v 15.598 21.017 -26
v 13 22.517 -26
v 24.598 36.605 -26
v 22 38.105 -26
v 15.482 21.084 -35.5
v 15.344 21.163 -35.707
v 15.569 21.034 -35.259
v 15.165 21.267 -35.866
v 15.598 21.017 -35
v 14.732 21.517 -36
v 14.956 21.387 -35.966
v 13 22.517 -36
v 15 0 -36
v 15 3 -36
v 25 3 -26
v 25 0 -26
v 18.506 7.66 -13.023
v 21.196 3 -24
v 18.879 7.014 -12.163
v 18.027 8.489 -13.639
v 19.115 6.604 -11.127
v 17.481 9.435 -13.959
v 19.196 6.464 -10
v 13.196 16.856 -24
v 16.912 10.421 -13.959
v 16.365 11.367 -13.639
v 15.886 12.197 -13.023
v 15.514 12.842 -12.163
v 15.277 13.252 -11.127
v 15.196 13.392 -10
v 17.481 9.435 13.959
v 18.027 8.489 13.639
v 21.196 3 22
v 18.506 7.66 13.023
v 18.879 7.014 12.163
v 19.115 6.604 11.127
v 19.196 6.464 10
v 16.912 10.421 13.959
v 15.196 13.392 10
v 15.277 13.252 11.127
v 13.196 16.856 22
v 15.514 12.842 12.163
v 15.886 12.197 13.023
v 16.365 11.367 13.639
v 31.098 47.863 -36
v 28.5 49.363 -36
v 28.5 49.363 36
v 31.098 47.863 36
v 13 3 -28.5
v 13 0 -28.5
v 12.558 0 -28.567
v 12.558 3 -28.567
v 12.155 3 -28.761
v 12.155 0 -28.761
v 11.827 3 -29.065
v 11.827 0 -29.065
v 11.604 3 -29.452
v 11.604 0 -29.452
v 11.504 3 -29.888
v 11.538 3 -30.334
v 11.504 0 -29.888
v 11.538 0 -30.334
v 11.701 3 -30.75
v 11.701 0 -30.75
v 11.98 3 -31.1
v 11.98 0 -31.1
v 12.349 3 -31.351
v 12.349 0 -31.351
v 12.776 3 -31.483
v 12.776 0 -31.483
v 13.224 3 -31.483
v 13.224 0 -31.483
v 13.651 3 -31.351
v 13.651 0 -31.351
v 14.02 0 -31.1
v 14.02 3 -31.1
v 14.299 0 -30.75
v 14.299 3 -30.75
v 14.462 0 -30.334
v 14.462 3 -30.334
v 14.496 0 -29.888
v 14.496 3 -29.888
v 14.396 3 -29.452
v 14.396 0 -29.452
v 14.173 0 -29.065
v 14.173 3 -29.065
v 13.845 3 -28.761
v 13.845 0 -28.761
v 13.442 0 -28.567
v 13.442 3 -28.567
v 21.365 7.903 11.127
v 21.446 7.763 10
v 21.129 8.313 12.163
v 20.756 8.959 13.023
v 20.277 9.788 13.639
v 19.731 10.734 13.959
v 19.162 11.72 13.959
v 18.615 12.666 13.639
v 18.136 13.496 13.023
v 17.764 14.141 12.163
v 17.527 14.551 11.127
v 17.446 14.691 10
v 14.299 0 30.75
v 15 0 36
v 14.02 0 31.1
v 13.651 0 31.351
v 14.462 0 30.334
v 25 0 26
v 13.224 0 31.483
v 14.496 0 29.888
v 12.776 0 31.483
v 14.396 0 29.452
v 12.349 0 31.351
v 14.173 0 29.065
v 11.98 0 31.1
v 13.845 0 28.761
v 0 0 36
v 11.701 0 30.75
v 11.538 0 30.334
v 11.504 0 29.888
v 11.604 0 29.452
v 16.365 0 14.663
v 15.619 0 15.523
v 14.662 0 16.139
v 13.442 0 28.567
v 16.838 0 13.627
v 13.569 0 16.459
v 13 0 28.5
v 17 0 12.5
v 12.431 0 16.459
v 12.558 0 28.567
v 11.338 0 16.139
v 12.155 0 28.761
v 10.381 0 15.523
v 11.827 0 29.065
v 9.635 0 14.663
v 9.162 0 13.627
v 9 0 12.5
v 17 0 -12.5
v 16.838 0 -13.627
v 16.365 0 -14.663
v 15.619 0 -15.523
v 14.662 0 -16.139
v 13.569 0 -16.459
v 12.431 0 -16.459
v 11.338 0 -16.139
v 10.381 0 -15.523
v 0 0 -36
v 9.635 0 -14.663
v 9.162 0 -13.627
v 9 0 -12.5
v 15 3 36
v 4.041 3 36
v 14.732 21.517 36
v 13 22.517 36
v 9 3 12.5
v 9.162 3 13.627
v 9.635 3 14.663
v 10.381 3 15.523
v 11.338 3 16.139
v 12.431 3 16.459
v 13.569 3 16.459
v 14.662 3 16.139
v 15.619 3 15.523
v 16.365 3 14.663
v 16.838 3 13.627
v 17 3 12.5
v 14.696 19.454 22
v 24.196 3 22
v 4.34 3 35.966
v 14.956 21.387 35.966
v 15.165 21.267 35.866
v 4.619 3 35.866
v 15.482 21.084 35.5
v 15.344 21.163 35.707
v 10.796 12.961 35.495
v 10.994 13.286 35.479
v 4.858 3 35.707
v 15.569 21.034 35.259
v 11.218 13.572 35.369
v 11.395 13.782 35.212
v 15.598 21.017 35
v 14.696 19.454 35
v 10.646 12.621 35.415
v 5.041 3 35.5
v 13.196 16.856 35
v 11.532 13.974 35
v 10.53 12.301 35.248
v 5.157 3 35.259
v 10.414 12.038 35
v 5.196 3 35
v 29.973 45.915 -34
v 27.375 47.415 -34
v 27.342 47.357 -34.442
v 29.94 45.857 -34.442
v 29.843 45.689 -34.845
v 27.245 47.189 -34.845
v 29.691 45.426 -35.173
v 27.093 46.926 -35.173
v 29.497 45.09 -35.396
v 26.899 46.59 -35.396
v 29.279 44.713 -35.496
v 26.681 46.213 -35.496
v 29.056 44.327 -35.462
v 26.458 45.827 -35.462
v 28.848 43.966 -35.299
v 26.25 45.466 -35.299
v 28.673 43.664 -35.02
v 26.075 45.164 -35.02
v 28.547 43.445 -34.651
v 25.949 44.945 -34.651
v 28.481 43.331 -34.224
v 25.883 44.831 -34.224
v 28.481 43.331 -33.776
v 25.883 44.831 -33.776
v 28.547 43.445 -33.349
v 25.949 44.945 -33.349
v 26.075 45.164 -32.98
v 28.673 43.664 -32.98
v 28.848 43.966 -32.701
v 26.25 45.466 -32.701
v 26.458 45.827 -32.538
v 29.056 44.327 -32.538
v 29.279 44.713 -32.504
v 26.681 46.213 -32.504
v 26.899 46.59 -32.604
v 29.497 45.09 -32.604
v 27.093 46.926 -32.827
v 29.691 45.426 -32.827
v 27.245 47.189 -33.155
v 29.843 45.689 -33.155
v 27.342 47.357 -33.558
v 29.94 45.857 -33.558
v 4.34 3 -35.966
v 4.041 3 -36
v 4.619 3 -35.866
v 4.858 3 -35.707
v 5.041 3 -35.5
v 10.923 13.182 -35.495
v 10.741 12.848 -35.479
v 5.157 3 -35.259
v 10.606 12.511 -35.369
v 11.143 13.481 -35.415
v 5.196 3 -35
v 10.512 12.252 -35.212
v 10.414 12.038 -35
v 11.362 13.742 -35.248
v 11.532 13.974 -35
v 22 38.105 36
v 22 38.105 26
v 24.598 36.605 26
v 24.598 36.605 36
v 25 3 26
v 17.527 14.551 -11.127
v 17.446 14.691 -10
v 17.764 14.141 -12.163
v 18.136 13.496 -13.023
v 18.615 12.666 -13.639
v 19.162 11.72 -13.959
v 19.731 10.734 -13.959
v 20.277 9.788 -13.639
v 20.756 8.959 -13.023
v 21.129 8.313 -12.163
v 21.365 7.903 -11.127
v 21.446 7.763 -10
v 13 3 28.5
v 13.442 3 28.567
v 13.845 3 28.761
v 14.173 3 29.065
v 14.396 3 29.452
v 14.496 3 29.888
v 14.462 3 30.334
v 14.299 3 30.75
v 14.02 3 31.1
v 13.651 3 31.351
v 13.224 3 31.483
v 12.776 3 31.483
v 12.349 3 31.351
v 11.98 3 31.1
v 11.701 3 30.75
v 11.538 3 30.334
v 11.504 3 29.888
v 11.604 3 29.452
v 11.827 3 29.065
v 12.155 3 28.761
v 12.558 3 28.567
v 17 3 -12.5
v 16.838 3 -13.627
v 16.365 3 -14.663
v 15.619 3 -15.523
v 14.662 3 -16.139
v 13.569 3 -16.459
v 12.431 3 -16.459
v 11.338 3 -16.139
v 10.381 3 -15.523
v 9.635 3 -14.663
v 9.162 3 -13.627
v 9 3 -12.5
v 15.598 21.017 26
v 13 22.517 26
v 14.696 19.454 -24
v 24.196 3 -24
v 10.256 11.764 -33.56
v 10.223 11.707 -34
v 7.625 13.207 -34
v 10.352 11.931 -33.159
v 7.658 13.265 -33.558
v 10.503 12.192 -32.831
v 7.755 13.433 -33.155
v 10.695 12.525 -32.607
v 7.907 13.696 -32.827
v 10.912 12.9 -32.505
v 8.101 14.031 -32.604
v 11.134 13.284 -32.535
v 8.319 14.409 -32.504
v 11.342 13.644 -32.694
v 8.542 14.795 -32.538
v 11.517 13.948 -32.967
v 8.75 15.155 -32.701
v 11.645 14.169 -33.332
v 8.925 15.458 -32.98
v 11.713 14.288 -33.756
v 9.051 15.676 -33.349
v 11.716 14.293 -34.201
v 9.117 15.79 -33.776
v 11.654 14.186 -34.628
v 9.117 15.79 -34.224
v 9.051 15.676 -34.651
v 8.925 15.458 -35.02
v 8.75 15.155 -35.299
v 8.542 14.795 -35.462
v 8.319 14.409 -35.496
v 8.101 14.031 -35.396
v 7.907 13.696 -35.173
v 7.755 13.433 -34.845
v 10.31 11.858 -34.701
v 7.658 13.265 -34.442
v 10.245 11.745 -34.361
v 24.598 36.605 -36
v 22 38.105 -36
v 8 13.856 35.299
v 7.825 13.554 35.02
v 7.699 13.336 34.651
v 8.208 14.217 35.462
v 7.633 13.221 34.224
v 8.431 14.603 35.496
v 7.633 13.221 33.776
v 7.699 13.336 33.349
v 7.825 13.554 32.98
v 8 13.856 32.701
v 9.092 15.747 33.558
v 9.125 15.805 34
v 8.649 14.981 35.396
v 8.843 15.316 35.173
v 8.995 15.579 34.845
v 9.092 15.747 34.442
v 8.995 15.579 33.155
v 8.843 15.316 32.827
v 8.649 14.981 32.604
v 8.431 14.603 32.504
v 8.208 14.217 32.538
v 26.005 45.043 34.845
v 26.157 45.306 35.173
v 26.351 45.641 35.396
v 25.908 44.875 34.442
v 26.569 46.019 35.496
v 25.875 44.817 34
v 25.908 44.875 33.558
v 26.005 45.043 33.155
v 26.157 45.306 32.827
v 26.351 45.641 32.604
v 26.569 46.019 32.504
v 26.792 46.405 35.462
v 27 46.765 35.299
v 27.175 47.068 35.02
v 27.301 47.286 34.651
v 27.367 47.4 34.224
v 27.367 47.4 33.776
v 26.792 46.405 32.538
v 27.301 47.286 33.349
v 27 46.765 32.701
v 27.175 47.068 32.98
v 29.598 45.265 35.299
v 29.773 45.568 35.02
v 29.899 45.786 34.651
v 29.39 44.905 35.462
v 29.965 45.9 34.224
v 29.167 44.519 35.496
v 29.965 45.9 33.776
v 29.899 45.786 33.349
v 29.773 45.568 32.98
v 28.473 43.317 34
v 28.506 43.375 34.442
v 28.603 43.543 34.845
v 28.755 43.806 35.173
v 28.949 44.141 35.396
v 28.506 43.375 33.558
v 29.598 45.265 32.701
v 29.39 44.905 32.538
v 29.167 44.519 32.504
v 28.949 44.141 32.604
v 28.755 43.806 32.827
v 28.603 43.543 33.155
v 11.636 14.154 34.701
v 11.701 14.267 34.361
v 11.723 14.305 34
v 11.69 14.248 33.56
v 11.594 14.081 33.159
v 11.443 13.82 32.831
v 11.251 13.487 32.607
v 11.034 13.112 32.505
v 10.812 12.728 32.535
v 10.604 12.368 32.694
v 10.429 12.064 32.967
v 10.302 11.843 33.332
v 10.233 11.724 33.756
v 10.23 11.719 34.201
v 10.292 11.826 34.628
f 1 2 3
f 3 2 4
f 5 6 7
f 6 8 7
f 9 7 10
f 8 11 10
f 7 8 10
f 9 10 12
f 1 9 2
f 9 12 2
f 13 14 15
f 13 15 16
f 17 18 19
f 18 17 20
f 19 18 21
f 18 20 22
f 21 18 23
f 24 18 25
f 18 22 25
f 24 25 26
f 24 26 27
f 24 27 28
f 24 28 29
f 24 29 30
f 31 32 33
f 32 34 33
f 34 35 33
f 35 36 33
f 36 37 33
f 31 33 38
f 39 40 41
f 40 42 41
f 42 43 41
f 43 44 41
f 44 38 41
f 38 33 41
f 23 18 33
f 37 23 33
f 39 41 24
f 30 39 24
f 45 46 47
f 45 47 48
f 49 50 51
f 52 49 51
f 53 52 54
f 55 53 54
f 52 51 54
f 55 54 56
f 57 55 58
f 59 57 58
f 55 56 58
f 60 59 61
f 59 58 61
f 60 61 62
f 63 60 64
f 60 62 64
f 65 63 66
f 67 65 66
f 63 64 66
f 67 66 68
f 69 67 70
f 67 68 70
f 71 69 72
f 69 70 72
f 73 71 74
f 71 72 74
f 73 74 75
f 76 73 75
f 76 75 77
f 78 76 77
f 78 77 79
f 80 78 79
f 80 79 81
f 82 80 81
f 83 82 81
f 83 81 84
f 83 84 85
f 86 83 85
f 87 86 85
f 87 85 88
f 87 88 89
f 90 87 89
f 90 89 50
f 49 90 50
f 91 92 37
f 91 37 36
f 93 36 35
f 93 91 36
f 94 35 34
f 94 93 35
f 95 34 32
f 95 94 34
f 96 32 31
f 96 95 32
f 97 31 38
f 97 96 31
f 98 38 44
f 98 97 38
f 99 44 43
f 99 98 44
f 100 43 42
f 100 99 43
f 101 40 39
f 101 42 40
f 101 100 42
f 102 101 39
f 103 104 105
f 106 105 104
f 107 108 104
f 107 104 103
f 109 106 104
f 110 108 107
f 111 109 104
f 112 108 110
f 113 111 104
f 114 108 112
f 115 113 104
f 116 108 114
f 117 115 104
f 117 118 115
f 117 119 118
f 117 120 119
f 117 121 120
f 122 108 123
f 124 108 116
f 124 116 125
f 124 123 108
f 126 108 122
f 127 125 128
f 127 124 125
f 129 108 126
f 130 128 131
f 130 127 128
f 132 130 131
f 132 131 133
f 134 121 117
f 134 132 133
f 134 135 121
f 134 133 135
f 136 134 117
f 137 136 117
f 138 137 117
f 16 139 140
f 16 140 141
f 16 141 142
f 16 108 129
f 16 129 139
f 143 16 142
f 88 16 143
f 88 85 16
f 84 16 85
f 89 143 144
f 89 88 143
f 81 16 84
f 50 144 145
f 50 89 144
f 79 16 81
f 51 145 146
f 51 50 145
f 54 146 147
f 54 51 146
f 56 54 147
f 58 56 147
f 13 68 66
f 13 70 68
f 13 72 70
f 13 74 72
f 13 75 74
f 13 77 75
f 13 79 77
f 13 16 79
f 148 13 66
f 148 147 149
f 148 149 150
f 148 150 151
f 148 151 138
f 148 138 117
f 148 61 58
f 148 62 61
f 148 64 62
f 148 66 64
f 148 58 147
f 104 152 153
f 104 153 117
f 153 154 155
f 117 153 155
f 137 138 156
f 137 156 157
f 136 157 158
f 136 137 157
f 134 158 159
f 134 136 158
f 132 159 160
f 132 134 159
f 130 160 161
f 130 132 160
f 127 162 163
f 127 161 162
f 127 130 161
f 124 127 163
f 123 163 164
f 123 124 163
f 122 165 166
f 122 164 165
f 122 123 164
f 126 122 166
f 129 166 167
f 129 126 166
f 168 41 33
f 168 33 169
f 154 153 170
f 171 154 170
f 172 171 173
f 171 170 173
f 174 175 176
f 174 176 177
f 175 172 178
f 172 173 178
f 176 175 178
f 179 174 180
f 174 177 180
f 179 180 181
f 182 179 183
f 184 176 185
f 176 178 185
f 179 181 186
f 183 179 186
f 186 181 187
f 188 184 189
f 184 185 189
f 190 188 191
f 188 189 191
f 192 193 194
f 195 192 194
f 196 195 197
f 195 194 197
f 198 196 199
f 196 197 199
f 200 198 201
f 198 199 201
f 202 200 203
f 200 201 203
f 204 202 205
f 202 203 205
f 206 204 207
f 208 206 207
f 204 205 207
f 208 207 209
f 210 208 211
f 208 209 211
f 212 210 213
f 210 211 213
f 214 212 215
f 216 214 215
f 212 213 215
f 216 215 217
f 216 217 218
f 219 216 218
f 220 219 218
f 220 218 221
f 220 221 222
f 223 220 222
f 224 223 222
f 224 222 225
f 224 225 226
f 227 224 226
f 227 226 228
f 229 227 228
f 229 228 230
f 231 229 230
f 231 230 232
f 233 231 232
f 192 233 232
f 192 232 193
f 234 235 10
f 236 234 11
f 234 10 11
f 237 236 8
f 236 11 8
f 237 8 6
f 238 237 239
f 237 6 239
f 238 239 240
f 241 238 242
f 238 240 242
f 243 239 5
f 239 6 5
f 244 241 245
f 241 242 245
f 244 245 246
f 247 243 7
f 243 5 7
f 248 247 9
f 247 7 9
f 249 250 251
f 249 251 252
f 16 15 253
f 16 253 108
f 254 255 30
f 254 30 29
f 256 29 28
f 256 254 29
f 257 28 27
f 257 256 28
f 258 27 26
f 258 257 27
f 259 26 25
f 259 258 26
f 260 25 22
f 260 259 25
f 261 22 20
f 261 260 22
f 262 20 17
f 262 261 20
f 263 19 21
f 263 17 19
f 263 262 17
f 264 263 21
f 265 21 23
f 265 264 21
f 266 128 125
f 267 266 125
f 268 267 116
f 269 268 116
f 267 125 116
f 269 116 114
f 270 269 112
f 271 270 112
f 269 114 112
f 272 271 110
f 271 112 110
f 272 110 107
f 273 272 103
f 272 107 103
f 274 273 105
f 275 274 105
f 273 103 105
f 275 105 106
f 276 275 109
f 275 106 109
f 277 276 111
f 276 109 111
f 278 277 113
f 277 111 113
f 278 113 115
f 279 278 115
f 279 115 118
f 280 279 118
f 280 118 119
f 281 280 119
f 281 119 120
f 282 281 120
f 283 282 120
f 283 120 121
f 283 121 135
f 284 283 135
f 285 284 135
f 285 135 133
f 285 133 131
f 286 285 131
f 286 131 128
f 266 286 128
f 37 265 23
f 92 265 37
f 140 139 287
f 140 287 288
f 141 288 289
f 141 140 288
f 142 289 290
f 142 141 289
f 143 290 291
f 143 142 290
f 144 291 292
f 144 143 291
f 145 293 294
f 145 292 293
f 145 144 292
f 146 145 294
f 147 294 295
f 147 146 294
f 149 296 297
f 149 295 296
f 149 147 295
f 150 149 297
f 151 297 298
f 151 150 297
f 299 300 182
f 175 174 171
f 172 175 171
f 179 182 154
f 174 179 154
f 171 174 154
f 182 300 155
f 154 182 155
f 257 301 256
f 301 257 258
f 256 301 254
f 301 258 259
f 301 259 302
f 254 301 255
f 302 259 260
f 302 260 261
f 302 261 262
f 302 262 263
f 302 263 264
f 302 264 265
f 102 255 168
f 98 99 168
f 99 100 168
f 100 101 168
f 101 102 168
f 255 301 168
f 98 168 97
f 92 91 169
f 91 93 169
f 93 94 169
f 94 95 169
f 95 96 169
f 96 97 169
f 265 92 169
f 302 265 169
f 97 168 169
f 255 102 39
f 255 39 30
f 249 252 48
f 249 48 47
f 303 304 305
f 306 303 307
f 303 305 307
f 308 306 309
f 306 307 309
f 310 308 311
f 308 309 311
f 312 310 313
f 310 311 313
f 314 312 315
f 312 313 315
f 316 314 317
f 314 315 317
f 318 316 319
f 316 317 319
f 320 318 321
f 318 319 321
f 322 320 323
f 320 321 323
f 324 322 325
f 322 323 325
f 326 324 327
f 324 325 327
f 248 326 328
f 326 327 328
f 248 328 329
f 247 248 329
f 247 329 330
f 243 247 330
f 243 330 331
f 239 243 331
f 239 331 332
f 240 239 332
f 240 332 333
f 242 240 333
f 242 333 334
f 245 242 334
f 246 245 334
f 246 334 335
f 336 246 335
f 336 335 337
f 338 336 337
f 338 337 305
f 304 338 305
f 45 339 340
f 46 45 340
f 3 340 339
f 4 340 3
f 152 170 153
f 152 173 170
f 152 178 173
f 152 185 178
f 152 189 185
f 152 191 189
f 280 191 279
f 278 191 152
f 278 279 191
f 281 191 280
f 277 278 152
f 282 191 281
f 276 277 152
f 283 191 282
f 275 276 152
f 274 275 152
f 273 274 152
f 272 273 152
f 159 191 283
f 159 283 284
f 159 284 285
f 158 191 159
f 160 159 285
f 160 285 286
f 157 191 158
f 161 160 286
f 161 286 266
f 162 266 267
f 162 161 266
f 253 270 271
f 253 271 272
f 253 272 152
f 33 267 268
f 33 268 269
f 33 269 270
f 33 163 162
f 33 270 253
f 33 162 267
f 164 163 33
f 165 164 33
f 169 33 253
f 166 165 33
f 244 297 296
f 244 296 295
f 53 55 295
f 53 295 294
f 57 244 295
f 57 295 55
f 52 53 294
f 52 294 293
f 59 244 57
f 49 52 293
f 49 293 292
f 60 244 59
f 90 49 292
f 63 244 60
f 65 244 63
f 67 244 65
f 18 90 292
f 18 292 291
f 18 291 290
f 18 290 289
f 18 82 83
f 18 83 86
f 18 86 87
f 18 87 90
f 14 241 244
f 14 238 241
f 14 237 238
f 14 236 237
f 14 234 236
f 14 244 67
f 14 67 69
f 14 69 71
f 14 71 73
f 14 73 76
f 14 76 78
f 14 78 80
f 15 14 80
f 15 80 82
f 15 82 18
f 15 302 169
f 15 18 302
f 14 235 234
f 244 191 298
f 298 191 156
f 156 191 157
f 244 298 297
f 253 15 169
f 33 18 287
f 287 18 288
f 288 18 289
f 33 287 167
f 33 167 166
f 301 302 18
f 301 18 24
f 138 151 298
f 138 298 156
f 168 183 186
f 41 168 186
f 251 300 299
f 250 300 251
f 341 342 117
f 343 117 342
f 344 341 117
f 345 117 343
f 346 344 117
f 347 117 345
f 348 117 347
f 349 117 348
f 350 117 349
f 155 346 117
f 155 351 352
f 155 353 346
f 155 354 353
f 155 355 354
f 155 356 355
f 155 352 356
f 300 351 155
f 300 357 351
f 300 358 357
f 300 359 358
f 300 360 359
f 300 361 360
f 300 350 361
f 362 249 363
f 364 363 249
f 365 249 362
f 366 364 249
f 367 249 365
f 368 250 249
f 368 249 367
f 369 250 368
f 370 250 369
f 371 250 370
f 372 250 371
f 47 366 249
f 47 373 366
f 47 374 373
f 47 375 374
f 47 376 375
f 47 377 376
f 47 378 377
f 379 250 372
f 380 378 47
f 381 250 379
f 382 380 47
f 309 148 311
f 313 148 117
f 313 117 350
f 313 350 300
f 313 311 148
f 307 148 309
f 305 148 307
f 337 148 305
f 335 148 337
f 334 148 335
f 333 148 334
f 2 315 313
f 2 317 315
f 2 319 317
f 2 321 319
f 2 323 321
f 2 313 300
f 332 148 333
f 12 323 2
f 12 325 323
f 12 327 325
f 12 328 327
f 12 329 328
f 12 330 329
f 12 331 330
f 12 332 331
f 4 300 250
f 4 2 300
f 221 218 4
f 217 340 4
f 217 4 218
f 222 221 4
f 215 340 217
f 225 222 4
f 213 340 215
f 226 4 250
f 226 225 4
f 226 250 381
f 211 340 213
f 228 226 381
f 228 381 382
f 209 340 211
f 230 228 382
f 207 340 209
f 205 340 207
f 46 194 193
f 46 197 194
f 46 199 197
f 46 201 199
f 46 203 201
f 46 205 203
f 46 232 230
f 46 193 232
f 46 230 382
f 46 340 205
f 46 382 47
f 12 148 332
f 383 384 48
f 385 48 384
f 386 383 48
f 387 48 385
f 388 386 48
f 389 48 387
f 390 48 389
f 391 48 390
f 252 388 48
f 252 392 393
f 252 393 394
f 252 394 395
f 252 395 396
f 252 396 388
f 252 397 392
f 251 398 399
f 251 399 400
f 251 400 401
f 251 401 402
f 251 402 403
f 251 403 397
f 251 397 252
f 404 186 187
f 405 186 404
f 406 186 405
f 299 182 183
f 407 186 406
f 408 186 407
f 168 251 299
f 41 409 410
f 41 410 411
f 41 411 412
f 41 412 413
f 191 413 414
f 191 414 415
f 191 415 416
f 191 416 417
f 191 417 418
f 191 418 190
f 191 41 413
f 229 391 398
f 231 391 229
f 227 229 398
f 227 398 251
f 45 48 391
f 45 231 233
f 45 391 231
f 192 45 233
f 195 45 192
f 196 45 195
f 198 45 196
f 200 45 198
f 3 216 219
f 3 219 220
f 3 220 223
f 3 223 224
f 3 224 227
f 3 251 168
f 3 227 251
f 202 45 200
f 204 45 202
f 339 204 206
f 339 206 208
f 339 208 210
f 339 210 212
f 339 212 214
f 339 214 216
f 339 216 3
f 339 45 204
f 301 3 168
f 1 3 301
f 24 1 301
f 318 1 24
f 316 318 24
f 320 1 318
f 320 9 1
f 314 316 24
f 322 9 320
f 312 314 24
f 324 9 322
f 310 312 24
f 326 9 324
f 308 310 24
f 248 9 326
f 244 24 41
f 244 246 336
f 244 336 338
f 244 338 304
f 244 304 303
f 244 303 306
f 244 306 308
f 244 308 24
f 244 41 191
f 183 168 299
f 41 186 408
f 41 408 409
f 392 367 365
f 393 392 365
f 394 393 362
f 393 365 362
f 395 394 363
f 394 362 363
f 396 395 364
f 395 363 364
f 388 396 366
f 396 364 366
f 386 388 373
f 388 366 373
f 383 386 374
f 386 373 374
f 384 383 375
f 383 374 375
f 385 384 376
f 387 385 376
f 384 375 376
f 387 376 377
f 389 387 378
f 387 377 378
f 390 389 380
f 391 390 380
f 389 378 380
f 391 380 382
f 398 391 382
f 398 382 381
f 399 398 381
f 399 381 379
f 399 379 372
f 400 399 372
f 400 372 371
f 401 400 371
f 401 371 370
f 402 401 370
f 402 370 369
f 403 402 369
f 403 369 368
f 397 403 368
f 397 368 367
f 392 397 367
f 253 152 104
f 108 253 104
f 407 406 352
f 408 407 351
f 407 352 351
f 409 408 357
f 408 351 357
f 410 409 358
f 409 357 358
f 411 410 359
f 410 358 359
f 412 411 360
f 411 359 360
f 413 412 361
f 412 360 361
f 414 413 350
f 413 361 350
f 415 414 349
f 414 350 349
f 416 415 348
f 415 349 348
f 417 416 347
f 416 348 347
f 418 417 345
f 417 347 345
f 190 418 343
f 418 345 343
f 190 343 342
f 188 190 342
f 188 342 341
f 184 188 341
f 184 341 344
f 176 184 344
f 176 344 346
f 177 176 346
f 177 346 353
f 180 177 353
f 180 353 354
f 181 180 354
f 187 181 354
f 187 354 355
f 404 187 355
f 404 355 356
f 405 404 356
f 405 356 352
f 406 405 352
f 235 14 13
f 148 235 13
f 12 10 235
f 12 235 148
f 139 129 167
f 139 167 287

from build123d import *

# Parameters (mm, degrees)
EXTRUDE_1_DEPTH      = 36
EXTRUDE_1_DEPTH_BACK = 36
EXTRUDE_2_DEPTH      = 60
SKETCH_4_R           = 1.5
SKETCH_4_W           = 10
SKETCH_4_H           = 18
CUT_EXTRUDE_1_DEPTH  = 6
CUT_EXTRUDE_3_DEPTH  = 14
SKETCH_9_R           = 1.5
CUT_EXTRUDE_5_DEPTH  = 6
CUT_EXTRUDE_6_DEPTH  = 3
FILLET_1_R           = 1
CHAMFER_1_SIZE       = 10


with BuildPart() as part:
    # 草图2 → 凸台-拉伸1 (new, two sides: drawn at the far end of the back side and taken through both)
    with BuildSketch(Plane.XY.offset(-EXTRUDE_1_DEPTH_BACK)):
        Polygon((0, 0), (28.5, 49.363448016), (31.098076211, 47.863448016), (5.196152423, 3), (25, 3), (25, 0), align=None)
    extrude(amount=EXTRUDE_1_DEPTH + EXTRUDE_1_DEPTH_BACK)

    # 草图3 → 凸台-拉伸2 (add)
    with BuildSketch(Plane.XY.offset(36)):
        Polygon((13.196152423, 16.856406461), (14.696152423, 19.454482672), (24.196152423, 3), (21.196152423, 3), align=None)
    extrude(amount=-EXTRUDE_2_DEPTH)

    # 草图4 → 切除-拉伸1 (cut)
    with BuildSketch(Plane(origin=(0, 0, 0), x_dir=(0, 0, 1), z_dir=(-0.8660254037844365, 0.500000000000004, 0))):
        with Locations(Location((34, 53.25, 0), (0, 0, 270))):
            Circle(SKETCH_4_R)
        with Locations(Location((34, 16.75, 0), (0, 0, 90))):
            Circle(SKETCH_4_R)
        with Locations(Location((-34, 16.75, 0), (0, 0, 270))):
            Circle(SKETCH_4_R)
        with Locations(Location((-34, 53.25, 0), (0, 0, 90))):
            Circle(SKETCH_4_R)
        with Locations((31, 35)):
            Rectangle(SKETCH_4_W, SKETCH_4_H)
        with Locations((-31, 35)):
            Rectangle(SKETCH_4_W, SKETCH_4_H)
    extrude(amount=-CUT_EXTRUDE_1_DEPTH, mode=Mode.SUBTRACT)

    # 草图6 → 切除-拉伸3 (cut)
    with BuildSketch(Plane.XY.offset(36)):
        Polygon((24.196152423, 3), (14.696152423, 19.454482672), (13.196152423, 16.856406461), (21.196152423, 3), align=None)
    extrude(amount=-CUT_EXTRUDE_3_DEPTH, mode=Mode.SUBTRACT)

    # 草图9 → 切除-拉伸5 (cut)
    with BuildSketch(Plane.XZ):
        with Locations(Location((13, 30, 0), (0, 0, 270))):
            Circle(SKETCH_9_R)
        with Locations(Location((13, -30, 0), (0, 0, 90))):
            Circle(SKETCH_9_R)
        with BuildLine():
            Line((9, -12.5), (9, 12.5))
            ThreePointArc((9, 12.5), (13, 16.5), (17, 12.5))
            Line((17, 12.5), (17, -12.5))
            ThreePointArc((17, -12.5), (13, -16.5), (9, -12.5))
        make_face()
    extrude(amount=-CUT_EXTRUDE_5_DEPTH, mode=Mode.SUBTRACT)

    # 草图11 → 切除-拉伸6 (cut)
    with BuildSketch(Plane(origin=(19.446152423, 11.227241336, 0), x_dir=(0, 0, -1), z_dir=(0.8660254037844374, 0.5000000000000022, 0))):
        with BuildLine():
            Line((-10, 4), (10, 4))
            ThreePointArc((10, 4), (14, 0), (10, -4))
            Line((10, -4), (-10, -4))
            ThreePointArc((-10, -4), (-14, 0), (-10, 4))
        make_face()
    extrude(amount=-CUT_EXTRUDE_6_DEPTH, mode=Mode.SUBTRACT)

    # 圆角1
    # the kernel refuses this fillet: 1 mm, written as the material it takes off along each edge
    with BuildSketch(Plane(origin=(16.848076211, 23.181724008, -36), x_dir=(-0.8660254037844364, 0.500000000000004, 0), z_dir=(-0.5000000000000039, -0.8660254037844364, 0))) as fillet_1_piece_1_section:
        with BuildLine():
            CenterArc((FILLET_1_R, -FILLET_1_R), FILLET_1_R, 90, 90)
            Line((0, -FILLET_1_R), (0, 0))
            Line((0, 0), (FILLET_1_R, 0))
        make_face()
    fillet_1_piece_1 = extrude(amount=25.803847577, mode=Mode.PRIVATE)
    fillet_1_piece_1 = split(fillet_1_piece_1, bisect_by=Plane(origin=(10.79221618, 3, -35.774281329), z_dir=(0, 1, 0)), keep=Keep.TOP, mode=Mode.PRIVATE)
    add(fillet_1_piece_1, mode=Mode.SUBTRACT)
    with BuildSketch(Plane(origin=(3.946152423, 0.834936491, 36), x_dir=(-0.8660254037844366, 0.5000000000000037, 0), z_dir=(0.5000000000000037, 0.8660254037844366, 0))) as fillet_1_piece_2_section:
        with BuildLine():
            CenterArc((FILLET_1_R, -FILLET_1_R), FILLET_1_R, 90, 90)
            Line((0, -FILLET_1_R), (0, 0))
            Line((0, 0), (FILLET_1_R, 0))
        make_face()
    fillet_1_piece_2 = extrude(amount=25.803847577, mode=Mode.PRIVATE)
    fillet_1_piece_2 = split(fillet_1_piece_2, bisect_by=Plane(origin=(10.79221618, 3, 35.774281329), z_dir=(0, 1, 0)), keep=Keep.TOP, mode=Mode.PRIVATE)
    add(fillet_1_piece_2, mode=Mode.SUBTRACT)

    # 倒角1
    chamfer_1_edges = [part.edges().sort_by_distance(p)[0] for p in [
        (25, 1.5, 36),
        (25, 1.5, -36),
    ]]
    chamfer(chamfer_1_edges, length=CHAMFER_1_SIZE)


solid = part.part
